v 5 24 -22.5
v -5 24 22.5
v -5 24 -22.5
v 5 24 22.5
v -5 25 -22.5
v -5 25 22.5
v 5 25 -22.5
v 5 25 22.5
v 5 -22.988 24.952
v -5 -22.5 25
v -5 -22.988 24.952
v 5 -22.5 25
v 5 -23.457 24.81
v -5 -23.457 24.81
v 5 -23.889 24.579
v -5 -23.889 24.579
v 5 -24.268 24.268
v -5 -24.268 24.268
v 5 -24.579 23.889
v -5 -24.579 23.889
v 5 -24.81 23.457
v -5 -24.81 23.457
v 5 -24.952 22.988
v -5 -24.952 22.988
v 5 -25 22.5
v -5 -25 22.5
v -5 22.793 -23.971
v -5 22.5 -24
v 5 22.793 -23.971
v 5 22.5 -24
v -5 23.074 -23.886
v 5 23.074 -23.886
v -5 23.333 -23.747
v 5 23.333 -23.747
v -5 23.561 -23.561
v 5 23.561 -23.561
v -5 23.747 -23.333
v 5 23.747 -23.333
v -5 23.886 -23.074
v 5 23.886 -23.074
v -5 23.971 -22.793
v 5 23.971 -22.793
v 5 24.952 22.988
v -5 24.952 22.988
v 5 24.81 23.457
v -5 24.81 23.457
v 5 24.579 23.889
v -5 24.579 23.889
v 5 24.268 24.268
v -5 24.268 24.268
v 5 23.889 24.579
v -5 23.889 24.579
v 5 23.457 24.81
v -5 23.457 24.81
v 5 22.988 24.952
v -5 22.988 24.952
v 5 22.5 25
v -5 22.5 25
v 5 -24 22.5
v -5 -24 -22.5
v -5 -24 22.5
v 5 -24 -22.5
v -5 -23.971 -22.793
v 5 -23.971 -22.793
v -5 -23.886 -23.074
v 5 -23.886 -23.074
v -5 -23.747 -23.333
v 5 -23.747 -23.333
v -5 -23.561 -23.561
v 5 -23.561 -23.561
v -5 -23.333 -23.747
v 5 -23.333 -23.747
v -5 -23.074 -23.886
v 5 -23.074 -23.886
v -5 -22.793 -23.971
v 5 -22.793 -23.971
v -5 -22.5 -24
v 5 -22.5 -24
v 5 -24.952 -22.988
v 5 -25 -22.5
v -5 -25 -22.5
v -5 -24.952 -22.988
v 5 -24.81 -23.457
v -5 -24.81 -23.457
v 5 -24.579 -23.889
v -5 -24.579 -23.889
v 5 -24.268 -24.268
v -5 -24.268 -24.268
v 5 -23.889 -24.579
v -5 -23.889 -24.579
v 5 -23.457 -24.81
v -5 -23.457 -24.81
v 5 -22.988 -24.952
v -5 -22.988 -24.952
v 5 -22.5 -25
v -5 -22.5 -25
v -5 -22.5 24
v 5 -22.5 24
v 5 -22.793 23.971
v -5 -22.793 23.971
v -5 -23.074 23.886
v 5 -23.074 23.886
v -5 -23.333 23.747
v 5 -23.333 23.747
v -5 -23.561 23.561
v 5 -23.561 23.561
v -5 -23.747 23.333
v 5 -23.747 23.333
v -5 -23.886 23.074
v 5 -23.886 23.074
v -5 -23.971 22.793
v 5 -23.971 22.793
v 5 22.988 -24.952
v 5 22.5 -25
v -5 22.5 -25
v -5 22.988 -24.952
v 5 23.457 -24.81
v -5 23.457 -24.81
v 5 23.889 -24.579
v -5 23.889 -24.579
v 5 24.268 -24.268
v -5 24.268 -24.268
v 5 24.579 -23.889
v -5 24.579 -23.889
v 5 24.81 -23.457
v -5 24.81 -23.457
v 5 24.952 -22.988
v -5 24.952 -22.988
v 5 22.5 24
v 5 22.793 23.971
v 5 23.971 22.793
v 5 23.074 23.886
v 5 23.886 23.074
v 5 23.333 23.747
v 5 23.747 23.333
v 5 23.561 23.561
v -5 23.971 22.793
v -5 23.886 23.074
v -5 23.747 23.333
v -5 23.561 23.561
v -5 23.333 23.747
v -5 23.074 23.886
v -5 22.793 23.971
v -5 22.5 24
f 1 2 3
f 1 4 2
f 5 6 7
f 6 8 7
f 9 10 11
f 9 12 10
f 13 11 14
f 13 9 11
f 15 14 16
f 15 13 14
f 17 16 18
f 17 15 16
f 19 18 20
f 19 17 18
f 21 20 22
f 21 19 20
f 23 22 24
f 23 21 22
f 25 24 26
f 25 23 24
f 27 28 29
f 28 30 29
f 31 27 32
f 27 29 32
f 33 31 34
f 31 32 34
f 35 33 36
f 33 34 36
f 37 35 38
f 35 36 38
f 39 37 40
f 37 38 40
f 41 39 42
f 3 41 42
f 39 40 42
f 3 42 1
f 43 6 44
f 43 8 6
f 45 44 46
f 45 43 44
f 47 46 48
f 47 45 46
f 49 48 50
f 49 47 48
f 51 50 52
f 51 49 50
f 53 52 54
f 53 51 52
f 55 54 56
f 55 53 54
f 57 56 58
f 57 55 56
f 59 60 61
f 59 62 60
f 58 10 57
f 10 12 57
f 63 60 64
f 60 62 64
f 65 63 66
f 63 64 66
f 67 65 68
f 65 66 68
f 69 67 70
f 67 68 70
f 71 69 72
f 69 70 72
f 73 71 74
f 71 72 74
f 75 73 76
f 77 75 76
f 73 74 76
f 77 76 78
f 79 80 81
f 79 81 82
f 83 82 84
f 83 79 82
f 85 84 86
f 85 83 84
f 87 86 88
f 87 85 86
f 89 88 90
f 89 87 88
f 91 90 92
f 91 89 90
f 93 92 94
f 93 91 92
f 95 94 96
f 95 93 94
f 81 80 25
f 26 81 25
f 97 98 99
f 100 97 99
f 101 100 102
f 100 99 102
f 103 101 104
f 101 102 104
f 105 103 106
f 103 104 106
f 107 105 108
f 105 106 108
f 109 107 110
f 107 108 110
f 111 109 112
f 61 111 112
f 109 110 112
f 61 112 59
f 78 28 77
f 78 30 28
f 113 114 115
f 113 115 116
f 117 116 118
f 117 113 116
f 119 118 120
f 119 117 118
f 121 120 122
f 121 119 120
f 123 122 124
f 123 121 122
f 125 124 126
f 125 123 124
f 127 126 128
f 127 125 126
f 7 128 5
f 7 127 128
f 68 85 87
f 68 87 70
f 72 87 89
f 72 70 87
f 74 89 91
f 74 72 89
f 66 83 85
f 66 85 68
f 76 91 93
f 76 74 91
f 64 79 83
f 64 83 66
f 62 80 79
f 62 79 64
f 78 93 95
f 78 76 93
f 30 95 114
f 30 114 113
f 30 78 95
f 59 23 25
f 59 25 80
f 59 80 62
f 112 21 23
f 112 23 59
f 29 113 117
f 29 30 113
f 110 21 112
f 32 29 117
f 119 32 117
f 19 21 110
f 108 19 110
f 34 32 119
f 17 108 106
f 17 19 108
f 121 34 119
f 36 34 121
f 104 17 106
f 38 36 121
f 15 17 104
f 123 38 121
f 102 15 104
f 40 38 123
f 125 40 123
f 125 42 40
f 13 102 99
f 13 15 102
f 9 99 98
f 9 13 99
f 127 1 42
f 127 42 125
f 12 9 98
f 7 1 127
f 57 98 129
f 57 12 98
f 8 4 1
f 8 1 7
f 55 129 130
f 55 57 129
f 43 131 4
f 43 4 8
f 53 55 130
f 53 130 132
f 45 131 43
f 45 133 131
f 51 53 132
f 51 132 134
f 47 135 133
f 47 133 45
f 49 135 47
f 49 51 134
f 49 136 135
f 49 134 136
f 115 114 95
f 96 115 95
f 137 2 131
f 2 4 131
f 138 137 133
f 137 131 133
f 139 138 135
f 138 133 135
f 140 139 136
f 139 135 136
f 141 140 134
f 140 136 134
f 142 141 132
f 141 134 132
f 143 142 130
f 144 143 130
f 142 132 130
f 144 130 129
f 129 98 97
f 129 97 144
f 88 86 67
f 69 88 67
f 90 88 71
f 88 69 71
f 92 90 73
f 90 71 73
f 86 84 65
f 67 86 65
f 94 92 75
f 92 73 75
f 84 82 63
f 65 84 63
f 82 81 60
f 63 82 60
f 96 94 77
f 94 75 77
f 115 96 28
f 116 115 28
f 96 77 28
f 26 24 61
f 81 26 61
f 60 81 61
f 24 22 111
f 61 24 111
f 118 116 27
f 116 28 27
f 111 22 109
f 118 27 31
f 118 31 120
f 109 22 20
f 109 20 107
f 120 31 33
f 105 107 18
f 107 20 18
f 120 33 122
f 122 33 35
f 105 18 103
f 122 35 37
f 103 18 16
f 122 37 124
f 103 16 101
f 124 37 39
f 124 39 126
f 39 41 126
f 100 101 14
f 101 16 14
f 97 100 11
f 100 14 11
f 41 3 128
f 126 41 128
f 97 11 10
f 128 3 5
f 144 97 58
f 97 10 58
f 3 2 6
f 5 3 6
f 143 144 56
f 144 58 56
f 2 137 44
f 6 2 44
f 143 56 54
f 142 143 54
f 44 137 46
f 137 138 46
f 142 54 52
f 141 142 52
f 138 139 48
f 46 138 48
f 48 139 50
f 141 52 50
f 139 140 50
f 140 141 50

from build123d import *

# Parameters (mm, degrees)
PAD_DEPTH = 5


with BuildPart() as part:
    # Sketch → Pad (new body, symmetric)
    with BuildSketch(Plane.YZ):
        with BuildLine():
            ThreePointArc((-22.5, 25), (-24.267767, 24.267767), (-25, 22.5))
            Line((-25, -22.5), (-25, 22.5))
            ThreePointArc((-25, -22.5), (-24.267767, -24.267767), (-22.5, -25))
            Line((22.5, -25), (-22.5, -25))
            ThreePointArc((22.5, -25), (24.267767, -24.267767), (25, -22.5))
            Line((25, 22.5), (25, -22.5))
            ThreePointArc((25, 22.5), (24.267767, 24.267767), (22.5, 25))
            Line((-22.5, 25), (22.5, 25))
        make_face()
        with BuildLine():
            ThreePointArc((-22.5, 24), (-23.56066, 23.56066), (-24, 22.5))
            Line((-24, -22.5), (-24, 22.5))
            ThreePointArc((-24, -22.5), (-23.56066, -23.56066), (-22.5, -24))
            Line((22.5, -24), (-22.5, -24))
            ThreePointArc((22.5, -24), (23.56066, -23.56066), (24, -22.5))
            Line((24, 22.5), (24, -22.5))
            ThreePointArc((24, 22.5), (23.56066, 23.56066), (22.5, 24))
            Line((-22.5, 24), (22.5, 24))
        make_face(mode=Mode.SUBTRACT)
    extrude(amount=PAD_DEPTH, both=True)


solid = part.part
